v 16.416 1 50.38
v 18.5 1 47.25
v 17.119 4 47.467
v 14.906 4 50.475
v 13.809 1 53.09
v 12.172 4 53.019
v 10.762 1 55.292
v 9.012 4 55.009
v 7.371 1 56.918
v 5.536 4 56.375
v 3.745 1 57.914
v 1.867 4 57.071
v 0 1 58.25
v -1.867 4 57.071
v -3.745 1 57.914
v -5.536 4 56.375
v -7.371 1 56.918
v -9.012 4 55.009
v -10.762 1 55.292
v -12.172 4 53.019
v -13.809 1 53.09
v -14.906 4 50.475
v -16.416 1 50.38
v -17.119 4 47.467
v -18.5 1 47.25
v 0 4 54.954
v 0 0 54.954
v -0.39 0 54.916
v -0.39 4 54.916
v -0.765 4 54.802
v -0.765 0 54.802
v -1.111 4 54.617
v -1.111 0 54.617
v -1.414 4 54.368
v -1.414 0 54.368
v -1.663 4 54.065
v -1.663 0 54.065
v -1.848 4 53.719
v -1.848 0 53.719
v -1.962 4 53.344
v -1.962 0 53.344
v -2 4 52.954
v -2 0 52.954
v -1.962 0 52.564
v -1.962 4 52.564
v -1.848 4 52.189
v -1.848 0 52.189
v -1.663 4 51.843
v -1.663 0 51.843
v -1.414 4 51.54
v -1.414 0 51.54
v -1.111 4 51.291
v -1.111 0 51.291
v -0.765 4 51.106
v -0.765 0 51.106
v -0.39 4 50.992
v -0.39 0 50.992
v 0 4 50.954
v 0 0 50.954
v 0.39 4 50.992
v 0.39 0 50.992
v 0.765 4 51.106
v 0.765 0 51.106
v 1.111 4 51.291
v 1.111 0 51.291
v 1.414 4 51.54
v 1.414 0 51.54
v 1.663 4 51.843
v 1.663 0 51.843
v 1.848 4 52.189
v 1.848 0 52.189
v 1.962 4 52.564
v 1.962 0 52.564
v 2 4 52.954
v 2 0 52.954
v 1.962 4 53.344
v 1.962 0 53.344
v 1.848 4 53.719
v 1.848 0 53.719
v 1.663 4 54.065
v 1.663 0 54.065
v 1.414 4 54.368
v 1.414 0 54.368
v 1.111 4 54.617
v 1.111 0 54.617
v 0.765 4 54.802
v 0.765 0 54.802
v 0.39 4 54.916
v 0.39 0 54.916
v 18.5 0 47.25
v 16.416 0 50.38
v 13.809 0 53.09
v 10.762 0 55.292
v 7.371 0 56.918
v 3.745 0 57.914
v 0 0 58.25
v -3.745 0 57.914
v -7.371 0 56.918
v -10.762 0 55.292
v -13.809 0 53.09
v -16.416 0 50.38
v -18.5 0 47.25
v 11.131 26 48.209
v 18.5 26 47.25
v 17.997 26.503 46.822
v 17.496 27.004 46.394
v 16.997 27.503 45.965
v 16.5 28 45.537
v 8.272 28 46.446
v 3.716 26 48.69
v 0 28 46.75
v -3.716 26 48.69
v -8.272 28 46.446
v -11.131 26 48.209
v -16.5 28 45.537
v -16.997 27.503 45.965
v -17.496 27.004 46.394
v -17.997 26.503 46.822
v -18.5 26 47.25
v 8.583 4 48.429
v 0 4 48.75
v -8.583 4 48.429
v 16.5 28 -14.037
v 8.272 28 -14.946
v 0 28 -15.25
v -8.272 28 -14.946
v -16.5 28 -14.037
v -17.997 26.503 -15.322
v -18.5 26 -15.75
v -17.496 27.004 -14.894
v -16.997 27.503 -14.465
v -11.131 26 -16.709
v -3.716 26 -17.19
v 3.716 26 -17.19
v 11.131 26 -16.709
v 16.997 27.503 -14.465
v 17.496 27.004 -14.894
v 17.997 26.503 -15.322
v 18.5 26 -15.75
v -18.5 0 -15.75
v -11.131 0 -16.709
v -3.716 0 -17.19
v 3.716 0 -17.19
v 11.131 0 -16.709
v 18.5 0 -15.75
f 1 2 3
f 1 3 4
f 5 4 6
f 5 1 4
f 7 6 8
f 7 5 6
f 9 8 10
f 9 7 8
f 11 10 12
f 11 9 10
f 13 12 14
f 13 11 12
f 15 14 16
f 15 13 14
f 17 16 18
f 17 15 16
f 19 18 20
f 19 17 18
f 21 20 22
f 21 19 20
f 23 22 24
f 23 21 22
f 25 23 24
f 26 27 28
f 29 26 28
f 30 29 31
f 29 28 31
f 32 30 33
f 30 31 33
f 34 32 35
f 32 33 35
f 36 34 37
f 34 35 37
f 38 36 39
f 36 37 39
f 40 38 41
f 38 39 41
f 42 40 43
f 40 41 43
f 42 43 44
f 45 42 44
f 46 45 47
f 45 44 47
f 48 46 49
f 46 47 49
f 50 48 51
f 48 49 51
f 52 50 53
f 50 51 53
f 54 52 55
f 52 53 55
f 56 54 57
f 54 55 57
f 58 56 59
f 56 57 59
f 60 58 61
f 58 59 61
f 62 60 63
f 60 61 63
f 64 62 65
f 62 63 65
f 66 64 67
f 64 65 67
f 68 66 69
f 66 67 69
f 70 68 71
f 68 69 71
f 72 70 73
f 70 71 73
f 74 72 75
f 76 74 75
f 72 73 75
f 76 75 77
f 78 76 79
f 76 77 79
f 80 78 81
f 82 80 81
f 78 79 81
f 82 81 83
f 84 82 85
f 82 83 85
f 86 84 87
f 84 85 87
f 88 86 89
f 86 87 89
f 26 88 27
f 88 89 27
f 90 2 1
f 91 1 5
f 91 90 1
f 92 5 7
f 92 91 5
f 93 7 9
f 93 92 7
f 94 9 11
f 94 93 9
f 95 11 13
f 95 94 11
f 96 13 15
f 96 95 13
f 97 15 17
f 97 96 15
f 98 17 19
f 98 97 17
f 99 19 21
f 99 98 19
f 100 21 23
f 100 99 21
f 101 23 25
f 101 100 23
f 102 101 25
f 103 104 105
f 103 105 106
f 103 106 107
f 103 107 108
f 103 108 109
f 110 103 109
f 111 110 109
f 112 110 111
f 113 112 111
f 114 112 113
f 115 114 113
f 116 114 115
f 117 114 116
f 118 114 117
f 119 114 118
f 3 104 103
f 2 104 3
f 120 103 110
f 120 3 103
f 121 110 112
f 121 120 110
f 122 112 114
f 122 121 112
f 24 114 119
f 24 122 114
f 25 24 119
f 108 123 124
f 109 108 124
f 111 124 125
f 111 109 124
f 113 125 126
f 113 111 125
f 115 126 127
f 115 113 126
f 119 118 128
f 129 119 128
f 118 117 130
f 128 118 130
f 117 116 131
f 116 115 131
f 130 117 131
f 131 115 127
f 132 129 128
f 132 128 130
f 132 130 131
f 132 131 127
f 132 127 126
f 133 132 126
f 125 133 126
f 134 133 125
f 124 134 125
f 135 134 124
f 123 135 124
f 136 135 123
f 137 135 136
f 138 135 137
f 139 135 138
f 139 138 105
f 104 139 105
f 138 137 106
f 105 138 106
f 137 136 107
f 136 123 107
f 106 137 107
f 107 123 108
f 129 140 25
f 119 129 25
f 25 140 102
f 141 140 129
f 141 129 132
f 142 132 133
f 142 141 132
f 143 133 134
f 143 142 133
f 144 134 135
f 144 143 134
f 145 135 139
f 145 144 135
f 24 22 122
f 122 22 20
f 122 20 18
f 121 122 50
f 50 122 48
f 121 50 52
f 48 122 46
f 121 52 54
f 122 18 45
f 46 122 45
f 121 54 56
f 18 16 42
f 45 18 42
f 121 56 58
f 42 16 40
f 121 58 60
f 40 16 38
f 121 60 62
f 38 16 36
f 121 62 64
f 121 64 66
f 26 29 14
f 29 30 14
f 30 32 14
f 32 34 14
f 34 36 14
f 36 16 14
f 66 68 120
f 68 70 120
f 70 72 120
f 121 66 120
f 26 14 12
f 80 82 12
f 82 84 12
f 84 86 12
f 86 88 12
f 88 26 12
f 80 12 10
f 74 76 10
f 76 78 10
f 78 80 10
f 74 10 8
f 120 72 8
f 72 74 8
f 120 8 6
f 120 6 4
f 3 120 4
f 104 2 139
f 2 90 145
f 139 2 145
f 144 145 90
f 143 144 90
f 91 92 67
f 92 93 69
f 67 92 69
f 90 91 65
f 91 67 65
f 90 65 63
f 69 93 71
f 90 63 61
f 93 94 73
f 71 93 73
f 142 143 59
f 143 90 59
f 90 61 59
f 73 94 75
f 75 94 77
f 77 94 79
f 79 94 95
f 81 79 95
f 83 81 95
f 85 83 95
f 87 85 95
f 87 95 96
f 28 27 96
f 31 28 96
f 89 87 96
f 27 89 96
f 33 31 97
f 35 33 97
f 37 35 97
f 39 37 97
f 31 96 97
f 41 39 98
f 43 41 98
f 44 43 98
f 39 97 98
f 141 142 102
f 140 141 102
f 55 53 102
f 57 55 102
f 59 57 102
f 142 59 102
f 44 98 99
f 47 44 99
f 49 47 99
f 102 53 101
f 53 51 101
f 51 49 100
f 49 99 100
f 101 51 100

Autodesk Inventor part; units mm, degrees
ref_plane "YZ Plane" through (0, 0, 0) normal (1, 0, 0) x (0, 1, 0)
ref_plane "XZ Plane" through (0, 0, 0) normal (0, 1, 0) x (-1, 0, 0)
ref_plane "XY Plane" through (0, 0, 0) normal (0, 0, 1) x (1, 0, 0)
sketch "Sketch1" plane through (0, 0, 0) normal (0, 1, 0) x (-1, 0, 0)
  line L0 (18.5, 15.75) -> (-18.5, 15.75)
  line L1 (-18.5, 15.75) -> (-18.5, -15.75)
  line L2 (-18.5, -15.75) -> (18.5, -15.75)
  line L3 (18.5, -15.75) -> (18.5, 15.75)
  line L4 (18.5, 15.75) -> (-18.5, -15.75) construction
  line L5 (-18.5, 15.75) -> (18.5, -15.75) construction
  line L6 (0, -15.75) -> (0, -17.25)
  arc A0 (-18.5, -15.75) -> (18.5, -15.75) centre (0, 97.5833) ccw
  line L7 (-18.5, 15.75) -> (-18.5, 47.25)
  line L8 (-18.5, 47.25) -> (18.5, 47.25)
  line L9 (18.5, 47.25) -> (18.5, 15.75)
  line L10 (18.5, 15.75) -> (-18.5, 47.25) construction
  line L11 (-18.5, 15.75) -> (18.5, 47.25) construction
  line L12 (0, 47.25) -> (0, 48.75)
  arc A1 (18.5, 47.25) -> (-18.5, 47.25) centre (0, -66.0833) ccw
  point P0 (0, 0)
  point P1 (0, 31.5)
  dimension "d5" = 37
  dimension "d6" = 31.5
  dimension "d7" = 1.5
extrude "Extrusion1" add sketch "Sketch1" along normal blind 28
sketch "Sketch2" plane through (0, 0, 0) normal (0, -1, 0) x (1, 0, 0)
  arc A0 (-18.5, -15.75) -> (18.5, -15.75) centre (0, 97.5833) ccw projected
  line L0 (18.5, 47.25) -> (18.5, -15.75) projected
  line L1 (-18.5, -15.75) -> (-18.5, 47.25) projected
  line L2 (0, -17.25) -> (0, 58.25)
  arc A1 (18.5, 47.25) -> (-18.5, 47.25) centre (0, 37.1932) ccw
  point P0 (0, 0)
  dimension "d10" = 75.5
extrude "Extrusion2" add sketch "Sketch2" against normal blind 4
chamfer "Chamfer1" distance 2 angle 45 4 edges at (-18.5, 28, 15.75) (0, 28, 48.75) (0, 28, -17.25) (18.5, 28, 15.75)
chamfer "Chamfer2" distance 3 angle 20 1 edges at (0, 4, 58.25) measured on face at (13.1668, 2.6667, 53.6257)
sketch "Sketch3" plane through (0, 4, 0) normal (0, 1, 0) x (1, 0, 0)
  arc A0 (-17.1187, -47.4669) -> (17.1187, -47.4669) centre (0, -37.1932) ccw projected
  arc A1 (-17.1187, -47.4669) -> (17.1187, -47.4669) centre (0, 66.0833) ccw projected
  line L0 (0, -52.954) -> (0, -48.75)
  line L1 (0, -57.1581) -> (0, -52.954)
  point P0 (0, 0)
hole "Hole1" at (0, 4, 52.954) direction (0, -1, 0) diameter 4 end through all
properties part number "12v_psu"
